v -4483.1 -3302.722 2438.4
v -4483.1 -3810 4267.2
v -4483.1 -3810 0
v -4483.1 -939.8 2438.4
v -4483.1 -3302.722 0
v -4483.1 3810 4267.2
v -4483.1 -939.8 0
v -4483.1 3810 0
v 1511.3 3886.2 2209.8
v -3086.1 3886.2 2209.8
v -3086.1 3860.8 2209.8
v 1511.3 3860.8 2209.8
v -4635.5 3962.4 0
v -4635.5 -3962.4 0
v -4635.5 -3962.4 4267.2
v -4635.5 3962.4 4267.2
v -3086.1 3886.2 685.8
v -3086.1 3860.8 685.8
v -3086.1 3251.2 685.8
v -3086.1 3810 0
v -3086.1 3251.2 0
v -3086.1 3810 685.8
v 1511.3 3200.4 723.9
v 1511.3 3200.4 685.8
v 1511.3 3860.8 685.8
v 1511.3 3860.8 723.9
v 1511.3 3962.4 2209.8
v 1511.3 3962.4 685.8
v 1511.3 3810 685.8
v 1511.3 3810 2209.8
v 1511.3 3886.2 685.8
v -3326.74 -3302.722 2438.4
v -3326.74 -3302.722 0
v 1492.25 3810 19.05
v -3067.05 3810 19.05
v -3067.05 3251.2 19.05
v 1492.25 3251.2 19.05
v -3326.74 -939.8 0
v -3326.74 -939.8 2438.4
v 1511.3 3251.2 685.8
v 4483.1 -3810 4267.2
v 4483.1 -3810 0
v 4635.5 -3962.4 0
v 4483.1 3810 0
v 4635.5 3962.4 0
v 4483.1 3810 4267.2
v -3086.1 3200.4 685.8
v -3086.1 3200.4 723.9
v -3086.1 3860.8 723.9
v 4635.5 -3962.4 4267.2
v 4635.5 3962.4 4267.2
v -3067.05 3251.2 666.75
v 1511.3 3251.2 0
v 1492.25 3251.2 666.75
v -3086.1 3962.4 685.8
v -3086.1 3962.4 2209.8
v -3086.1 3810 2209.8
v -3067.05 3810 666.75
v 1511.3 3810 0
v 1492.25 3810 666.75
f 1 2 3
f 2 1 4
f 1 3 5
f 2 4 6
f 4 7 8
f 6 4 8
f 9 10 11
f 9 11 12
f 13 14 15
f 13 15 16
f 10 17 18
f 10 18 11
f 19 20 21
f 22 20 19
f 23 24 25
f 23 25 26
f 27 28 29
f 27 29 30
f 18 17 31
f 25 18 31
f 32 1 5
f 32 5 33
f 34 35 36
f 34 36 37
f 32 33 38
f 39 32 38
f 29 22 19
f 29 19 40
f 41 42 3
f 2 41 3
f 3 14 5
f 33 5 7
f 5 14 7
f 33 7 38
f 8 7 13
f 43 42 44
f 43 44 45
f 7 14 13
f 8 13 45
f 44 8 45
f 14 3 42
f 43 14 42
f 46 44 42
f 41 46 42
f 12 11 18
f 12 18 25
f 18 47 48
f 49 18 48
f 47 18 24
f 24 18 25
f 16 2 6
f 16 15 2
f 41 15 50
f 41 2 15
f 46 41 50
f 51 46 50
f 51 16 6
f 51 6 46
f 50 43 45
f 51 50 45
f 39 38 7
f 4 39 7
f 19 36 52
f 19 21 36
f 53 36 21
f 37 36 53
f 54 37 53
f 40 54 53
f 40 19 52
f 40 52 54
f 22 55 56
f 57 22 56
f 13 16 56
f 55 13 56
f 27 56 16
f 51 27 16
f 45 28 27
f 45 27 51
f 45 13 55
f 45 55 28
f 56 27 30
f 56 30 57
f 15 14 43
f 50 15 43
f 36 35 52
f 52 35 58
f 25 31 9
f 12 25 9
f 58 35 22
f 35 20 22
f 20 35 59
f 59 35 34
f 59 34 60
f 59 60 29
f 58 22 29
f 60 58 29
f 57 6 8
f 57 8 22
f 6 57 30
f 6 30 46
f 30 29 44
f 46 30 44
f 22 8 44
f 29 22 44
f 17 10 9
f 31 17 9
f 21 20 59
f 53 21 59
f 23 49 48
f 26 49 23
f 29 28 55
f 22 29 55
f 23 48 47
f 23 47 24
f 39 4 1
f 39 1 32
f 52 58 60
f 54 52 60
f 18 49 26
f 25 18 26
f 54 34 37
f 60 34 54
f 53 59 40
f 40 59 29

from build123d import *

# Parameters (mm, degrees)
F0_W      = 9271
F0_H      = 7924.8
F1_DEPTH  = 4267.2
F2_DEPTH  = 25.4
F4_W      = 4597.4
F4_H      = 1524
F5_DEPTH  = 152.4
F6_W      = 1003.959779666
F6_H      = 2058.1215861365
F7_DEPTH  = 2438.4
F9_W      = 4597.4
F9_H      = 1524
F10_DEPTH = 25.4
F12_W     = 4597.4
F12_H     = 685.8
F12_W_2   = 4559.3
F12_H_2   = 647.7
F13_DEPTH = 558.8
F11_W     = 4597.4
F11_H     = 38.1
F14_DEPTH = 660.4
F15_W     = 50.8
F15_H     = 50.8
F16_DEPTH = 8966.2


# Not quite as in the source:
# - the program builds the solid bodies; features that only make, move or delete a surface that nothing else refers to are left out


with BuildPart() as f1:
    # F0 (on Top) → F1 (new body)
    with BuildSketch(Plane.XY):
        Rectangle(F0_W, F0_H)
        Polygon((4483.1, 2595.4701114655), (4483.1, -3810), (-4483.1, -3810), (-4483.1, 3810), (2247.9, 3810), (2349.5, 3810), (4483.1, 3810), (4483.1, 2697.0701114655), align=None, mode=Mode.SUBTRACT)
    extrude(amount=F1_DEPTH)

    # F0 (on Top) → F2 (join)
    with BuildSketch(Plane.XY):
        Rectangle(F0_W, F0_H)
        Polygon((4483.1, 2595.4701114655), (4483.1, -3810), (-4483.1, -3810), (-4483.1, 3810), (2247.9, 3810), (2349.5, 3810), (4483.1, 3810), (4483.1, 2697.0701114655), align=None, mode=Mode.SUBTRACT)
    extrude(amount=F2_DEPTH)

    # F4 (on face) → F5 (cut, through all)
    with BuildSketch(Plane(origin=(0, 3962.4, 0), x_dir=(-1, 0, 0), z_dir=(0, 1, 0))):
        with Locations((787.4, 1447.8)):
            Rectangle(F4_W, F4_H)
    extrude(amount=-F5_DEPTH, mode=Mode.SUBTRACT)

    # F6 (on Top) → F7 (join)
    with BuildSketch(Plane.XY):
        Polygon((-3326.740220334, -939.8), (-4483.1, -939.8), (-4483.1, -1092.2), (-3479.140220334, -1092.2), (-3479.140220334, -3150.3215861365), (-4483.1, -3150.3215861365), (-4483.1, -3302.7215861365), (-3326.740220334, -3302.7215861365), align=None)
        with Locations((-3981.120110167, -2121.2607930683)):
            Rectangle(F6_W, F6_H)
    extrude(amount=F7_DEPTH)


with BuildPart() as f10:
    # F9 (on offset) → F10 (new body)
    with BuildSketch(Plane.XZ.offset(-3886.2)):
        with Locations((-787.4, 1447.8)):
            Rectangle(F9_W, F9_H)
    extrude(amount=F10_DEPTH)


with BuildPart() as f13:
    # F12 (on face) → F13 (new body)
    with BuildSketch(Plane.XZ.offset(-3810)):
        with Locations((-787.4, 342.9)):
            Rectangle(F12_W, F12_H)
        with Locations((-787.4, 342.9)):
            Rectangle(F12_W_2, F12_H_2, mode=Mode.SUBTRACT)
    extrude(amount=F13_DEPTH)


with BuildPart() as f14:
    # F11 (on face) → F14 (new body)
    with BuildSketch(Plane.XZ.offset(-3860.8)):
        with Locations((-787.4, 704.85)):
            Rectangle(F11_W, F11_H)
    extrude(amount=F14_DEPTH)


with BuildPart() as f16:
    # F15 (on face) → F16 (new body, through all)
    with BuildSketch(Plane.YZ.offset(-4483.1)):
        with Locations((-914.4, 3276.6)):
            Rectangle(F15_W, F15_H)
    extrude(amount=F16_DEPTH)


solid = Compound([f1.part, f10.part, f13.part, f14.part])
